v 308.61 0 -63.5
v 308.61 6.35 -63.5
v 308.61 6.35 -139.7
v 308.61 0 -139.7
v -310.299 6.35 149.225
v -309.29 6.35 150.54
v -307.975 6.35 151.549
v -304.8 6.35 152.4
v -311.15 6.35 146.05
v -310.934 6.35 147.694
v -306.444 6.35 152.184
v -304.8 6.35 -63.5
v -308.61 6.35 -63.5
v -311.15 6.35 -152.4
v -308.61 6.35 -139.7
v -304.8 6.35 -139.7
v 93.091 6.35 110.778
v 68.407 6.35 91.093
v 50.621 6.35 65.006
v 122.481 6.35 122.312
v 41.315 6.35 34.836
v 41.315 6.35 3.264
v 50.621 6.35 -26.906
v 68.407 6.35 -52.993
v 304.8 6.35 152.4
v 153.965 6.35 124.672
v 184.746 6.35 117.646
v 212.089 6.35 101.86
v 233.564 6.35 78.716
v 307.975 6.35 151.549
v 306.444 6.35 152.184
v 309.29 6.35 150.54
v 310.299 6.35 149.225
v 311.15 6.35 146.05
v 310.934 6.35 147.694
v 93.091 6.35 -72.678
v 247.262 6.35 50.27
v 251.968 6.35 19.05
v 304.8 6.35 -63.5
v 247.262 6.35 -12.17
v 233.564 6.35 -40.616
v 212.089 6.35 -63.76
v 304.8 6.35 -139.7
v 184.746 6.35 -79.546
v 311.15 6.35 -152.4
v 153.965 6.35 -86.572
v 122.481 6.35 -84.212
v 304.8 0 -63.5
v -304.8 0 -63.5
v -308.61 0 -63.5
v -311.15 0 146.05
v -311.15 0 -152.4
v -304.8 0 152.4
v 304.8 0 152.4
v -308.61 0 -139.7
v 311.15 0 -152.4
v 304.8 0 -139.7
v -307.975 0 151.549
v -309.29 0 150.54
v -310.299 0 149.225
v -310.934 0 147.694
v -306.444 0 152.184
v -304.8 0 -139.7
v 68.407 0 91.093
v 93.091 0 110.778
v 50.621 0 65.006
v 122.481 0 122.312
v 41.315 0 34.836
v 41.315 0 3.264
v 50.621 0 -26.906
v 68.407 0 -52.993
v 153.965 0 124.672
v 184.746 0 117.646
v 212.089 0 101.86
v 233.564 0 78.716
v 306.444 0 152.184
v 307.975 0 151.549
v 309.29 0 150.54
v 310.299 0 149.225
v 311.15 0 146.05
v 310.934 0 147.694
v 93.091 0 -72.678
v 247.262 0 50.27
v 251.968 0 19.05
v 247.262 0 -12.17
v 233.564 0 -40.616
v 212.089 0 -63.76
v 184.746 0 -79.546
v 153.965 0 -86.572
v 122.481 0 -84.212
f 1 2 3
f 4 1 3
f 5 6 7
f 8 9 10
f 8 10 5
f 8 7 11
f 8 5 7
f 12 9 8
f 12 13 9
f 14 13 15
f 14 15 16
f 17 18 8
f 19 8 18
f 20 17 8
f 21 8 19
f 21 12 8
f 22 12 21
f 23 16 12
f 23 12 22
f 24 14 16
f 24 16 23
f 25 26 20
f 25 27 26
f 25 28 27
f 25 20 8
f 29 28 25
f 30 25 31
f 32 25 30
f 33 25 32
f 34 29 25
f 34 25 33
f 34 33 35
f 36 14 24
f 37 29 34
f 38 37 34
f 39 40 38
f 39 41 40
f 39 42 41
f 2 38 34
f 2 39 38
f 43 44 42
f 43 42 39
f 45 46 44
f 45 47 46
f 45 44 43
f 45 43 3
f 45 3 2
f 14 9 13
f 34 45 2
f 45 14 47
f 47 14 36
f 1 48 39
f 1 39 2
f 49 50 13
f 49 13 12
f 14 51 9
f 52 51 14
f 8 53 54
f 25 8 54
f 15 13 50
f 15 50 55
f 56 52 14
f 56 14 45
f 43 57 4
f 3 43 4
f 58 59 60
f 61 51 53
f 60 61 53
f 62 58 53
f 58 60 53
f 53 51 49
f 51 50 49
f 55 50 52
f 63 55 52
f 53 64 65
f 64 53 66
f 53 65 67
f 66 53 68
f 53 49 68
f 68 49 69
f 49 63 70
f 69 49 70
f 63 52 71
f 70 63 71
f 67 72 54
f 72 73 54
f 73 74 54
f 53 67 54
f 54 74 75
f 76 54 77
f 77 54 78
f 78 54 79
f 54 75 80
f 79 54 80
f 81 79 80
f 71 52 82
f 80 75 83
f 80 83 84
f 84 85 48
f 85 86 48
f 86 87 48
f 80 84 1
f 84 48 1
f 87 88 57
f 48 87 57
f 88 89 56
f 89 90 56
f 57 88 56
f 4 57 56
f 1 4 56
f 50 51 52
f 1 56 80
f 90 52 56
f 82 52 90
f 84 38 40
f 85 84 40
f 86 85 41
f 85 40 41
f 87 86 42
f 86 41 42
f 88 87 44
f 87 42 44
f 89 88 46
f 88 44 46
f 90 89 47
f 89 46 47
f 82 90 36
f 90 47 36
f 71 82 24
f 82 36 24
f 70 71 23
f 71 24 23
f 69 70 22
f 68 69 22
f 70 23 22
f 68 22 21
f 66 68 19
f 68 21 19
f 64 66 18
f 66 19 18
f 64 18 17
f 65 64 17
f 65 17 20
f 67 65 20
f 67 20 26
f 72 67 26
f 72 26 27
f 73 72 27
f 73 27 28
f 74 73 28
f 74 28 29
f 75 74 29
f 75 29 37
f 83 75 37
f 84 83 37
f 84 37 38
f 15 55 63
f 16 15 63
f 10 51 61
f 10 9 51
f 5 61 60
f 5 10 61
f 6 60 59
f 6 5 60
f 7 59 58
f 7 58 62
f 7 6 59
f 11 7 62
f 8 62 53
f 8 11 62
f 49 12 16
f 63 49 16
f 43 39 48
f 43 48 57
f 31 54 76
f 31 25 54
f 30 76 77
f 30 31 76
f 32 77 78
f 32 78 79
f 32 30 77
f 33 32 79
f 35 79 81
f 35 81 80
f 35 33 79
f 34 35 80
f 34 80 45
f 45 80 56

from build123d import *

# Parameters (mm, degrees)
CROQUIS2_W              = 622.3
CROQUIS2_H              = 304.8
SALIENTE_EXTRUIR1_DEPTH = 6.35
REDONDEO1_R             = 6.35
CROQUIS4_W              = 3.81
CROQUIS4_H              = 76.2
CORTAR_EXTRUIR2_DEPTH   = 7.35
CROQUIS5_R              = 105.918
CORTAR_EXTRUIR3_DEPTH   = 7.35


with BuildPart() as part:
    # Croquis2 → Saliente-Extruir1 (new body)
    with BuildSketch(Plane(origin=(0, 0, 0), x_dir=(1, 0, 0), z_dir=(0, 1, 0))):
        Rectangle(CROQUIS2_W, CROQUIS2_H)
    extrude(amount=SALIENTE_EXTRUIR1_DEPTH)

    # Redondeo1
    redondeo1_edges = [part.edges().sort_by_distance(p)[0] for p in [
        (311.15, 3.175, 152.4),
        (-311.15, 3.175, 152.4),
    ]]
    fillet(redondeo1_edges, radius=REDONDEO1_R)

    # Croquis4 → Cortar-Extruir2 (cut, through all)
    with BuildSketch(Plane(origin=(0, 6.35, 0), x_dir=(1, 0, 0), z_dir=(0, 1, 0))):
        with Locations((-306.705, 101.6)):
            Rectangle(CROQUIS4_W, CROQUIS4_H)
        with Locations((306.705, 101.6)):
            Rectangle(CROQUIS4_W, CROQUIS4_H)
    extrude(amount=-CORTAR_EXTRUIR2_DEPTH, mode=Mode.SUBTRACT)

    # Croquis5 → Cortar-Extruir3 (cut, through all)
    with BuildSketch(Plane(origin=(0, 6.35, 0), x_dir=(1, 0, 0), z_dir=(0, 1, 0))):
        with Locations((146.05, -19.05)):
            Circle(CROQUIS5_R)
    extrude(amount=-CORTAR_EXTRUIR3_DEPTH, mode=Mode.SUBTRACT)


solid = part.part
